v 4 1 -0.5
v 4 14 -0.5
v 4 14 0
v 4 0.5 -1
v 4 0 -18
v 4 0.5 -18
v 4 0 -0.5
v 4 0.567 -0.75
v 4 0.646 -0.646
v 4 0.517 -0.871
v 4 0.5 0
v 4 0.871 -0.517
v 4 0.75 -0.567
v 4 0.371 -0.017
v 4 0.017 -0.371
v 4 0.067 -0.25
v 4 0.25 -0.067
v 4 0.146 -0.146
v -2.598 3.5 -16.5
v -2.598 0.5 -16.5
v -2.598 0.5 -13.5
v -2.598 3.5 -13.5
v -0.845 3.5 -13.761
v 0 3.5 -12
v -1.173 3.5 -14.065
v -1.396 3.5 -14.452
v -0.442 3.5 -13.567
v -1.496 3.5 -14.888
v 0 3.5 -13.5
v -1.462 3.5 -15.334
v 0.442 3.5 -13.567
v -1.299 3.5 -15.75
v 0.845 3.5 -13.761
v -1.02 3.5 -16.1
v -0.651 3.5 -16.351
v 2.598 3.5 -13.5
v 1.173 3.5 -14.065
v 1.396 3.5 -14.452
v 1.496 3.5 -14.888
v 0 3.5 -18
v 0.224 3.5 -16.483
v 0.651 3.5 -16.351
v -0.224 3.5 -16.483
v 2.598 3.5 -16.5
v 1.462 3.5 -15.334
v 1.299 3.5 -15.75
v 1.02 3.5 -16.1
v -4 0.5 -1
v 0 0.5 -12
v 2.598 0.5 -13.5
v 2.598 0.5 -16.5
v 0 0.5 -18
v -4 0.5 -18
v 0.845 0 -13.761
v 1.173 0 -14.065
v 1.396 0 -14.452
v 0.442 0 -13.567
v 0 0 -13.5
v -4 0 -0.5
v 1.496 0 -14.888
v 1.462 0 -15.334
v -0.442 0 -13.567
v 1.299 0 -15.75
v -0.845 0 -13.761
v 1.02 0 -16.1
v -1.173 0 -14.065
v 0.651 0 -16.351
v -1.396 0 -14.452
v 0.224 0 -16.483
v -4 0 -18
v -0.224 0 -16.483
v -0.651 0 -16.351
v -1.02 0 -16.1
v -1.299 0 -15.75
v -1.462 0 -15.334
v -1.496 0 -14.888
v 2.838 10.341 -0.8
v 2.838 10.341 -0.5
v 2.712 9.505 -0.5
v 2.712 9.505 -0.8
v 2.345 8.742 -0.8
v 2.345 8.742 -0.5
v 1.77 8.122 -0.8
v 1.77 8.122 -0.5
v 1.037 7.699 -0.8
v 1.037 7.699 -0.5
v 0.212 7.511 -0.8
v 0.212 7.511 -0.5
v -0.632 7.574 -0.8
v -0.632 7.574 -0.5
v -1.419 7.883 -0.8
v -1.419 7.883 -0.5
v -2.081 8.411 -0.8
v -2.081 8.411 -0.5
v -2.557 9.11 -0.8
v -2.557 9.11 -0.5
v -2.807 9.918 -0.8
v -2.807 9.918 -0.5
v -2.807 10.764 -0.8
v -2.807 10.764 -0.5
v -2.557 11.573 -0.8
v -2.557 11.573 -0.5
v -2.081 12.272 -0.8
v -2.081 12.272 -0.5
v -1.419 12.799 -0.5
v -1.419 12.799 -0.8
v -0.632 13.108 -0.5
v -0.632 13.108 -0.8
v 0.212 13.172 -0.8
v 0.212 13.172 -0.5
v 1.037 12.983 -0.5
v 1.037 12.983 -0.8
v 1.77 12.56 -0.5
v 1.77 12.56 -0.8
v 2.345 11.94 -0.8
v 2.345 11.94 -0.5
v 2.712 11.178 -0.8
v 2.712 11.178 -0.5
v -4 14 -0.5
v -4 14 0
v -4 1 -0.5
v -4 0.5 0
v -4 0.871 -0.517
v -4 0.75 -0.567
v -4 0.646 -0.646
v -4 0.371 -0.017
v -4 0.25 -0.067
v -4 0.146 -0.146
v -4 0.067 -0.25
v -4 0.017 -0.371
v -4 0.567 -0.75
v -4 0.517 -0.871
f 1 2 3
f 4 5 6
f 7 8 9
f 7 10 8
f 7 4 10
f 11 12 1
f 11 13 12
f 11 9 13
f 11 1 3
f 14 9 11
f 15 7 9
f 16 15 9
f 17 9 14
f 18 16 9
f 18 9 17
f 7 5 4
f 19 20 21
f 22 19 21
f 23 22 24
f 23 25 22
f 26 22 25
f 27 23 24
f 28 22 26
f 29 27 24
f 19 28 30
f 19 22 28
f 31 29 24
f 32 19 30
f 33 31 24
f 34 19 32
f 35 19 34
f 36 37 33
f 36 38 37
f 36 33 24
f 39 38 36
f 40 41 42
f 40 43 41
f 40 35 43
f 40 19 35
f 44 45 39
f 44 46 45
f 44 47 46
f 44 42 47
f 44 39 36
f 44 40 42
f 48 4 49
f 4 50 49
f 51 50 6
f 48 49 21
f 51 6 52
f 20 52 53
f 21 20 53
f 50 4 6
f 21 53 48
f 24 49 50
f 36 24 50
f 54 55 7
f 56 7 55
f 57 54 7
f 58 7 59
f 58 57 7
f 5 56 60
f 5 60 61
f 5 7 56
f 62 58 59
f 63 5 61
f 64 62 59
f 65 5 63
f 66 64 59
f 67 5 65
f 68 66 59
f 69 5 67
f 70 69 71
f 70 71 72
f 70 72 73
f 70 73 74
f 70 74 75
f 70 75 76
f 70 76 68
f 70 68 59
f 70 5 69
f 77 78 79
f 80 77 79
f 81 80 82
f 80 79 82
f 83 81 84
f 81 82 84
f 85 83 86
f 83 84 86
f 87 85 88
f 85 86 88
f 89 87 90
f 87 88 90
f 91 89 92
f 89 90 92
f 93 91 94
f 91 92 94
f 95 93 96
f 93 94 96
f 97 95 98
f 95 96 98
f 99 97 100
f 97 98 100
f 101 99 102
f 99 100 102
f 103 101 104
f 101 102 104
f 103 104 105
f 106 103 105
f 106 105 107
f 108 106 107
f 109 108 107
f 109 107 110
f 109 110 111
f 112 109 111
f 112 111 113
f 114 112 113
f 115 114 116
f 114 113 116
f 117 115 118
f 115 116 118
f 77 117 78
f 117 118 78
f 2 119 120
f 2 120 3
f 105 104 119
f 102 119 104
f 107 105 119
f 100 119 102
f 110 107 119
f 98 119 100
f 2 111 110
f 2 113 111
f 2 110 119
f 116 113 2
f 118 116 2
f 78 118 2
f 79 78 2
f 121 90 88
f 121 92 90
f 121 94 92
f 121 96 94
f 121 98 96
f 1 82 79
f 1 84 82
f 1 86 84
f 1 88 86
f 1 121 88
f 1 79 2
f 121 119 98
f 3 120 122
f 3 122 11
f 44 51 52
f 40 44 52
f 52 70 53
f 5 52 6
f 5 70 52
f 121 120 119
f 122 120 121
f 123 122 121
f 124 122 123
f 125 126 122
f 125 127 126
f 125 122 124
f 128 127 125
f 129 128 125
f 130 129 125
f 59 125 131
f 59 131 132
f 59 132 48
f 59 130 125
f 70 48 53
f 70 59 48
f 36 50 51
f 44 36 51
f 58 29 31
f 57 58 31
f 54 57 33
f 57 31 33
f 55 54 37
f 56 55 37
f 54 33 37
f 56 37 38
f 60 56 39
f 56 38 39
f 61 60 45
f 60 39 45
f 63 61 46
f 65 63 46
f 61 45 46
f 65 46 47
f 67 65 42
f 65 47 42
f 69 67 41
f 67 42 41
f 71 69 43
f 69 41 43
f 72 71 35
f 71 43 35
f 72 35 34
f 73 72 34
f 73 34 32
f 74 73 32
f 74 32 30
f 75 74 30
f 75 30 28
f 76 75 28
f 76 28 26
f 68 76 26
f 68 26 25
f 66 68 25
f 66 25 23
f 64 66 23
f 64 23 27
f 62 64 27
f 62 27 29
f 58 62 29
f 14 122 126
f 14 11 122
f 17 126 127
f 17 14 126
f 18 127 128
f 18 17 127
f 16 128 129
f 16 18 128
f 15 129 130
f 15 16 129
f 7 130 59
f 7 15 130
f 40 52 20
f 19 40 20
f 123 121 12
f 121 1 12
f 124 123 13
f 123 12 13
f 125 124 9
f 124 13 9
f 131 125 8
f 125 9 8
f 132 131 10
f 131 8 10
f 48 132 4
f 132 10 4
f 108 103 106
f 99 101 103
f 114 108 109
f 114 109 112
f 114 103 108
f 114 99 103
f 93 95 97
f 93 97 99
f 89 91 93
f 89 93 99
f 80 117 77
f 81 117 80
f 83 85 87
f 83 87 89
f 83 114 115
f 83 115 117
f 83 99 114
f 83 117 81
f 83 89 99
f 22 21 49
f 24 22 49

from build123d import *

# Parameters (mm, degrees)
BOSS_EXTRUDE1_DEPTH = 0.5
SKETCH2_W           = 8
SKETCH2_H           = 0.5
BOSS_EXTRUDE2_DEPTH = 14
BOSS_EXTRUDE3_DEPTH = 3
SKETCH4_R           = 1.5
CUT_EXTRUDE1_DEPTH  = 13
FILLET1_R           = 0.5
FILLET2_R           = 0.5
SKETCH5_R           = 2.838371804
BOSS_EXTRUDE4_DEPTH = 0.3


with BuildPart() as part:
    # Sketch1 → Boss-Extrude1 (new body)
    with BuildSketch(Plane(origin=(0, 0, 0), x_dir=(1, 0, 0), z_dir=(0, 1, 0))):
        Polygon((0, 0), (-4, 0), (-4, 18), (4, 18), (4, 0), align=None)
    extrude(amount=BOSS_EXTRUDE1_DEPTH)

    # Sketch2 → Boss-Extrude2 (add)
    with BuildSketch(Plane(origin=(0, 0, 0), x_dir=(1, 0, 0), z_dir=(0, 1, 0))):
        with Locations((0, 0.25)):
            Rectangle(SKETCH2_W, SKETCH2_H)
    extrude(amount=BOSS_EXTRUDE2_DEPTH)

    # Sketch3 → Boss-Extrude3 (add)
    with BuildSketch(Plane(origin=(0, 0.5, 0), x_dir=(1, 0, 0), z_dir=(0, 1, 0))):
        Polygon((0, 18), (-2.598076211, 16.5), (-2.598076211, 13.5), (0, 12), (2.598076211, 13.5), (2.598076211, 16.5), align=None)
    extrude(amount=BOSS_EXTRUDE3_DEPTH)

    # Sketch4 → Cut-Extrude1 (cut)
    with BuildSketch(Plane(origin=(0, 3.5, 0), x_dir=(1, 0, 0), z_dir=(0, 1, 0))):
        with Locations(Location((0, 15, 0), (0, 0, 270))):
            Circle(SKETCH4_R)
    extrude(amount=-CUT_EXTRUDE1_DEPTH, mode=Mode.SUBTRACT)

    # Fillet1
    fillet1_edges = [part.edges().sort_by_distance(p)[0] for p in [
        (0, 0, 0),
    ]]
    fillet(fillet1_edges, radius=FILLET1_R)

    # Fillet2
    fillet2_edges = [part.edges().sort_by_distance(p)[0] for p in [
        (0, 0.5, -0.5),
    ]]
    fillet(fillet2_edges, radius=FILLET2_R)

    # Sketch5 → Boss-Extrude4 (add)
    with BuildSketch(Plane(origin=(0, 0, -0.5), x_dir=(-1, 0, 0), z_dir=(0, 0, -1))):
        with Locations(Location((0, 10.341282462, 0), (0, 0, 180))):
            Circle(SKETCH5_R)
    extrude(amount=BOSS_EXTRUDE4_DEPTH)


solid = part.part
